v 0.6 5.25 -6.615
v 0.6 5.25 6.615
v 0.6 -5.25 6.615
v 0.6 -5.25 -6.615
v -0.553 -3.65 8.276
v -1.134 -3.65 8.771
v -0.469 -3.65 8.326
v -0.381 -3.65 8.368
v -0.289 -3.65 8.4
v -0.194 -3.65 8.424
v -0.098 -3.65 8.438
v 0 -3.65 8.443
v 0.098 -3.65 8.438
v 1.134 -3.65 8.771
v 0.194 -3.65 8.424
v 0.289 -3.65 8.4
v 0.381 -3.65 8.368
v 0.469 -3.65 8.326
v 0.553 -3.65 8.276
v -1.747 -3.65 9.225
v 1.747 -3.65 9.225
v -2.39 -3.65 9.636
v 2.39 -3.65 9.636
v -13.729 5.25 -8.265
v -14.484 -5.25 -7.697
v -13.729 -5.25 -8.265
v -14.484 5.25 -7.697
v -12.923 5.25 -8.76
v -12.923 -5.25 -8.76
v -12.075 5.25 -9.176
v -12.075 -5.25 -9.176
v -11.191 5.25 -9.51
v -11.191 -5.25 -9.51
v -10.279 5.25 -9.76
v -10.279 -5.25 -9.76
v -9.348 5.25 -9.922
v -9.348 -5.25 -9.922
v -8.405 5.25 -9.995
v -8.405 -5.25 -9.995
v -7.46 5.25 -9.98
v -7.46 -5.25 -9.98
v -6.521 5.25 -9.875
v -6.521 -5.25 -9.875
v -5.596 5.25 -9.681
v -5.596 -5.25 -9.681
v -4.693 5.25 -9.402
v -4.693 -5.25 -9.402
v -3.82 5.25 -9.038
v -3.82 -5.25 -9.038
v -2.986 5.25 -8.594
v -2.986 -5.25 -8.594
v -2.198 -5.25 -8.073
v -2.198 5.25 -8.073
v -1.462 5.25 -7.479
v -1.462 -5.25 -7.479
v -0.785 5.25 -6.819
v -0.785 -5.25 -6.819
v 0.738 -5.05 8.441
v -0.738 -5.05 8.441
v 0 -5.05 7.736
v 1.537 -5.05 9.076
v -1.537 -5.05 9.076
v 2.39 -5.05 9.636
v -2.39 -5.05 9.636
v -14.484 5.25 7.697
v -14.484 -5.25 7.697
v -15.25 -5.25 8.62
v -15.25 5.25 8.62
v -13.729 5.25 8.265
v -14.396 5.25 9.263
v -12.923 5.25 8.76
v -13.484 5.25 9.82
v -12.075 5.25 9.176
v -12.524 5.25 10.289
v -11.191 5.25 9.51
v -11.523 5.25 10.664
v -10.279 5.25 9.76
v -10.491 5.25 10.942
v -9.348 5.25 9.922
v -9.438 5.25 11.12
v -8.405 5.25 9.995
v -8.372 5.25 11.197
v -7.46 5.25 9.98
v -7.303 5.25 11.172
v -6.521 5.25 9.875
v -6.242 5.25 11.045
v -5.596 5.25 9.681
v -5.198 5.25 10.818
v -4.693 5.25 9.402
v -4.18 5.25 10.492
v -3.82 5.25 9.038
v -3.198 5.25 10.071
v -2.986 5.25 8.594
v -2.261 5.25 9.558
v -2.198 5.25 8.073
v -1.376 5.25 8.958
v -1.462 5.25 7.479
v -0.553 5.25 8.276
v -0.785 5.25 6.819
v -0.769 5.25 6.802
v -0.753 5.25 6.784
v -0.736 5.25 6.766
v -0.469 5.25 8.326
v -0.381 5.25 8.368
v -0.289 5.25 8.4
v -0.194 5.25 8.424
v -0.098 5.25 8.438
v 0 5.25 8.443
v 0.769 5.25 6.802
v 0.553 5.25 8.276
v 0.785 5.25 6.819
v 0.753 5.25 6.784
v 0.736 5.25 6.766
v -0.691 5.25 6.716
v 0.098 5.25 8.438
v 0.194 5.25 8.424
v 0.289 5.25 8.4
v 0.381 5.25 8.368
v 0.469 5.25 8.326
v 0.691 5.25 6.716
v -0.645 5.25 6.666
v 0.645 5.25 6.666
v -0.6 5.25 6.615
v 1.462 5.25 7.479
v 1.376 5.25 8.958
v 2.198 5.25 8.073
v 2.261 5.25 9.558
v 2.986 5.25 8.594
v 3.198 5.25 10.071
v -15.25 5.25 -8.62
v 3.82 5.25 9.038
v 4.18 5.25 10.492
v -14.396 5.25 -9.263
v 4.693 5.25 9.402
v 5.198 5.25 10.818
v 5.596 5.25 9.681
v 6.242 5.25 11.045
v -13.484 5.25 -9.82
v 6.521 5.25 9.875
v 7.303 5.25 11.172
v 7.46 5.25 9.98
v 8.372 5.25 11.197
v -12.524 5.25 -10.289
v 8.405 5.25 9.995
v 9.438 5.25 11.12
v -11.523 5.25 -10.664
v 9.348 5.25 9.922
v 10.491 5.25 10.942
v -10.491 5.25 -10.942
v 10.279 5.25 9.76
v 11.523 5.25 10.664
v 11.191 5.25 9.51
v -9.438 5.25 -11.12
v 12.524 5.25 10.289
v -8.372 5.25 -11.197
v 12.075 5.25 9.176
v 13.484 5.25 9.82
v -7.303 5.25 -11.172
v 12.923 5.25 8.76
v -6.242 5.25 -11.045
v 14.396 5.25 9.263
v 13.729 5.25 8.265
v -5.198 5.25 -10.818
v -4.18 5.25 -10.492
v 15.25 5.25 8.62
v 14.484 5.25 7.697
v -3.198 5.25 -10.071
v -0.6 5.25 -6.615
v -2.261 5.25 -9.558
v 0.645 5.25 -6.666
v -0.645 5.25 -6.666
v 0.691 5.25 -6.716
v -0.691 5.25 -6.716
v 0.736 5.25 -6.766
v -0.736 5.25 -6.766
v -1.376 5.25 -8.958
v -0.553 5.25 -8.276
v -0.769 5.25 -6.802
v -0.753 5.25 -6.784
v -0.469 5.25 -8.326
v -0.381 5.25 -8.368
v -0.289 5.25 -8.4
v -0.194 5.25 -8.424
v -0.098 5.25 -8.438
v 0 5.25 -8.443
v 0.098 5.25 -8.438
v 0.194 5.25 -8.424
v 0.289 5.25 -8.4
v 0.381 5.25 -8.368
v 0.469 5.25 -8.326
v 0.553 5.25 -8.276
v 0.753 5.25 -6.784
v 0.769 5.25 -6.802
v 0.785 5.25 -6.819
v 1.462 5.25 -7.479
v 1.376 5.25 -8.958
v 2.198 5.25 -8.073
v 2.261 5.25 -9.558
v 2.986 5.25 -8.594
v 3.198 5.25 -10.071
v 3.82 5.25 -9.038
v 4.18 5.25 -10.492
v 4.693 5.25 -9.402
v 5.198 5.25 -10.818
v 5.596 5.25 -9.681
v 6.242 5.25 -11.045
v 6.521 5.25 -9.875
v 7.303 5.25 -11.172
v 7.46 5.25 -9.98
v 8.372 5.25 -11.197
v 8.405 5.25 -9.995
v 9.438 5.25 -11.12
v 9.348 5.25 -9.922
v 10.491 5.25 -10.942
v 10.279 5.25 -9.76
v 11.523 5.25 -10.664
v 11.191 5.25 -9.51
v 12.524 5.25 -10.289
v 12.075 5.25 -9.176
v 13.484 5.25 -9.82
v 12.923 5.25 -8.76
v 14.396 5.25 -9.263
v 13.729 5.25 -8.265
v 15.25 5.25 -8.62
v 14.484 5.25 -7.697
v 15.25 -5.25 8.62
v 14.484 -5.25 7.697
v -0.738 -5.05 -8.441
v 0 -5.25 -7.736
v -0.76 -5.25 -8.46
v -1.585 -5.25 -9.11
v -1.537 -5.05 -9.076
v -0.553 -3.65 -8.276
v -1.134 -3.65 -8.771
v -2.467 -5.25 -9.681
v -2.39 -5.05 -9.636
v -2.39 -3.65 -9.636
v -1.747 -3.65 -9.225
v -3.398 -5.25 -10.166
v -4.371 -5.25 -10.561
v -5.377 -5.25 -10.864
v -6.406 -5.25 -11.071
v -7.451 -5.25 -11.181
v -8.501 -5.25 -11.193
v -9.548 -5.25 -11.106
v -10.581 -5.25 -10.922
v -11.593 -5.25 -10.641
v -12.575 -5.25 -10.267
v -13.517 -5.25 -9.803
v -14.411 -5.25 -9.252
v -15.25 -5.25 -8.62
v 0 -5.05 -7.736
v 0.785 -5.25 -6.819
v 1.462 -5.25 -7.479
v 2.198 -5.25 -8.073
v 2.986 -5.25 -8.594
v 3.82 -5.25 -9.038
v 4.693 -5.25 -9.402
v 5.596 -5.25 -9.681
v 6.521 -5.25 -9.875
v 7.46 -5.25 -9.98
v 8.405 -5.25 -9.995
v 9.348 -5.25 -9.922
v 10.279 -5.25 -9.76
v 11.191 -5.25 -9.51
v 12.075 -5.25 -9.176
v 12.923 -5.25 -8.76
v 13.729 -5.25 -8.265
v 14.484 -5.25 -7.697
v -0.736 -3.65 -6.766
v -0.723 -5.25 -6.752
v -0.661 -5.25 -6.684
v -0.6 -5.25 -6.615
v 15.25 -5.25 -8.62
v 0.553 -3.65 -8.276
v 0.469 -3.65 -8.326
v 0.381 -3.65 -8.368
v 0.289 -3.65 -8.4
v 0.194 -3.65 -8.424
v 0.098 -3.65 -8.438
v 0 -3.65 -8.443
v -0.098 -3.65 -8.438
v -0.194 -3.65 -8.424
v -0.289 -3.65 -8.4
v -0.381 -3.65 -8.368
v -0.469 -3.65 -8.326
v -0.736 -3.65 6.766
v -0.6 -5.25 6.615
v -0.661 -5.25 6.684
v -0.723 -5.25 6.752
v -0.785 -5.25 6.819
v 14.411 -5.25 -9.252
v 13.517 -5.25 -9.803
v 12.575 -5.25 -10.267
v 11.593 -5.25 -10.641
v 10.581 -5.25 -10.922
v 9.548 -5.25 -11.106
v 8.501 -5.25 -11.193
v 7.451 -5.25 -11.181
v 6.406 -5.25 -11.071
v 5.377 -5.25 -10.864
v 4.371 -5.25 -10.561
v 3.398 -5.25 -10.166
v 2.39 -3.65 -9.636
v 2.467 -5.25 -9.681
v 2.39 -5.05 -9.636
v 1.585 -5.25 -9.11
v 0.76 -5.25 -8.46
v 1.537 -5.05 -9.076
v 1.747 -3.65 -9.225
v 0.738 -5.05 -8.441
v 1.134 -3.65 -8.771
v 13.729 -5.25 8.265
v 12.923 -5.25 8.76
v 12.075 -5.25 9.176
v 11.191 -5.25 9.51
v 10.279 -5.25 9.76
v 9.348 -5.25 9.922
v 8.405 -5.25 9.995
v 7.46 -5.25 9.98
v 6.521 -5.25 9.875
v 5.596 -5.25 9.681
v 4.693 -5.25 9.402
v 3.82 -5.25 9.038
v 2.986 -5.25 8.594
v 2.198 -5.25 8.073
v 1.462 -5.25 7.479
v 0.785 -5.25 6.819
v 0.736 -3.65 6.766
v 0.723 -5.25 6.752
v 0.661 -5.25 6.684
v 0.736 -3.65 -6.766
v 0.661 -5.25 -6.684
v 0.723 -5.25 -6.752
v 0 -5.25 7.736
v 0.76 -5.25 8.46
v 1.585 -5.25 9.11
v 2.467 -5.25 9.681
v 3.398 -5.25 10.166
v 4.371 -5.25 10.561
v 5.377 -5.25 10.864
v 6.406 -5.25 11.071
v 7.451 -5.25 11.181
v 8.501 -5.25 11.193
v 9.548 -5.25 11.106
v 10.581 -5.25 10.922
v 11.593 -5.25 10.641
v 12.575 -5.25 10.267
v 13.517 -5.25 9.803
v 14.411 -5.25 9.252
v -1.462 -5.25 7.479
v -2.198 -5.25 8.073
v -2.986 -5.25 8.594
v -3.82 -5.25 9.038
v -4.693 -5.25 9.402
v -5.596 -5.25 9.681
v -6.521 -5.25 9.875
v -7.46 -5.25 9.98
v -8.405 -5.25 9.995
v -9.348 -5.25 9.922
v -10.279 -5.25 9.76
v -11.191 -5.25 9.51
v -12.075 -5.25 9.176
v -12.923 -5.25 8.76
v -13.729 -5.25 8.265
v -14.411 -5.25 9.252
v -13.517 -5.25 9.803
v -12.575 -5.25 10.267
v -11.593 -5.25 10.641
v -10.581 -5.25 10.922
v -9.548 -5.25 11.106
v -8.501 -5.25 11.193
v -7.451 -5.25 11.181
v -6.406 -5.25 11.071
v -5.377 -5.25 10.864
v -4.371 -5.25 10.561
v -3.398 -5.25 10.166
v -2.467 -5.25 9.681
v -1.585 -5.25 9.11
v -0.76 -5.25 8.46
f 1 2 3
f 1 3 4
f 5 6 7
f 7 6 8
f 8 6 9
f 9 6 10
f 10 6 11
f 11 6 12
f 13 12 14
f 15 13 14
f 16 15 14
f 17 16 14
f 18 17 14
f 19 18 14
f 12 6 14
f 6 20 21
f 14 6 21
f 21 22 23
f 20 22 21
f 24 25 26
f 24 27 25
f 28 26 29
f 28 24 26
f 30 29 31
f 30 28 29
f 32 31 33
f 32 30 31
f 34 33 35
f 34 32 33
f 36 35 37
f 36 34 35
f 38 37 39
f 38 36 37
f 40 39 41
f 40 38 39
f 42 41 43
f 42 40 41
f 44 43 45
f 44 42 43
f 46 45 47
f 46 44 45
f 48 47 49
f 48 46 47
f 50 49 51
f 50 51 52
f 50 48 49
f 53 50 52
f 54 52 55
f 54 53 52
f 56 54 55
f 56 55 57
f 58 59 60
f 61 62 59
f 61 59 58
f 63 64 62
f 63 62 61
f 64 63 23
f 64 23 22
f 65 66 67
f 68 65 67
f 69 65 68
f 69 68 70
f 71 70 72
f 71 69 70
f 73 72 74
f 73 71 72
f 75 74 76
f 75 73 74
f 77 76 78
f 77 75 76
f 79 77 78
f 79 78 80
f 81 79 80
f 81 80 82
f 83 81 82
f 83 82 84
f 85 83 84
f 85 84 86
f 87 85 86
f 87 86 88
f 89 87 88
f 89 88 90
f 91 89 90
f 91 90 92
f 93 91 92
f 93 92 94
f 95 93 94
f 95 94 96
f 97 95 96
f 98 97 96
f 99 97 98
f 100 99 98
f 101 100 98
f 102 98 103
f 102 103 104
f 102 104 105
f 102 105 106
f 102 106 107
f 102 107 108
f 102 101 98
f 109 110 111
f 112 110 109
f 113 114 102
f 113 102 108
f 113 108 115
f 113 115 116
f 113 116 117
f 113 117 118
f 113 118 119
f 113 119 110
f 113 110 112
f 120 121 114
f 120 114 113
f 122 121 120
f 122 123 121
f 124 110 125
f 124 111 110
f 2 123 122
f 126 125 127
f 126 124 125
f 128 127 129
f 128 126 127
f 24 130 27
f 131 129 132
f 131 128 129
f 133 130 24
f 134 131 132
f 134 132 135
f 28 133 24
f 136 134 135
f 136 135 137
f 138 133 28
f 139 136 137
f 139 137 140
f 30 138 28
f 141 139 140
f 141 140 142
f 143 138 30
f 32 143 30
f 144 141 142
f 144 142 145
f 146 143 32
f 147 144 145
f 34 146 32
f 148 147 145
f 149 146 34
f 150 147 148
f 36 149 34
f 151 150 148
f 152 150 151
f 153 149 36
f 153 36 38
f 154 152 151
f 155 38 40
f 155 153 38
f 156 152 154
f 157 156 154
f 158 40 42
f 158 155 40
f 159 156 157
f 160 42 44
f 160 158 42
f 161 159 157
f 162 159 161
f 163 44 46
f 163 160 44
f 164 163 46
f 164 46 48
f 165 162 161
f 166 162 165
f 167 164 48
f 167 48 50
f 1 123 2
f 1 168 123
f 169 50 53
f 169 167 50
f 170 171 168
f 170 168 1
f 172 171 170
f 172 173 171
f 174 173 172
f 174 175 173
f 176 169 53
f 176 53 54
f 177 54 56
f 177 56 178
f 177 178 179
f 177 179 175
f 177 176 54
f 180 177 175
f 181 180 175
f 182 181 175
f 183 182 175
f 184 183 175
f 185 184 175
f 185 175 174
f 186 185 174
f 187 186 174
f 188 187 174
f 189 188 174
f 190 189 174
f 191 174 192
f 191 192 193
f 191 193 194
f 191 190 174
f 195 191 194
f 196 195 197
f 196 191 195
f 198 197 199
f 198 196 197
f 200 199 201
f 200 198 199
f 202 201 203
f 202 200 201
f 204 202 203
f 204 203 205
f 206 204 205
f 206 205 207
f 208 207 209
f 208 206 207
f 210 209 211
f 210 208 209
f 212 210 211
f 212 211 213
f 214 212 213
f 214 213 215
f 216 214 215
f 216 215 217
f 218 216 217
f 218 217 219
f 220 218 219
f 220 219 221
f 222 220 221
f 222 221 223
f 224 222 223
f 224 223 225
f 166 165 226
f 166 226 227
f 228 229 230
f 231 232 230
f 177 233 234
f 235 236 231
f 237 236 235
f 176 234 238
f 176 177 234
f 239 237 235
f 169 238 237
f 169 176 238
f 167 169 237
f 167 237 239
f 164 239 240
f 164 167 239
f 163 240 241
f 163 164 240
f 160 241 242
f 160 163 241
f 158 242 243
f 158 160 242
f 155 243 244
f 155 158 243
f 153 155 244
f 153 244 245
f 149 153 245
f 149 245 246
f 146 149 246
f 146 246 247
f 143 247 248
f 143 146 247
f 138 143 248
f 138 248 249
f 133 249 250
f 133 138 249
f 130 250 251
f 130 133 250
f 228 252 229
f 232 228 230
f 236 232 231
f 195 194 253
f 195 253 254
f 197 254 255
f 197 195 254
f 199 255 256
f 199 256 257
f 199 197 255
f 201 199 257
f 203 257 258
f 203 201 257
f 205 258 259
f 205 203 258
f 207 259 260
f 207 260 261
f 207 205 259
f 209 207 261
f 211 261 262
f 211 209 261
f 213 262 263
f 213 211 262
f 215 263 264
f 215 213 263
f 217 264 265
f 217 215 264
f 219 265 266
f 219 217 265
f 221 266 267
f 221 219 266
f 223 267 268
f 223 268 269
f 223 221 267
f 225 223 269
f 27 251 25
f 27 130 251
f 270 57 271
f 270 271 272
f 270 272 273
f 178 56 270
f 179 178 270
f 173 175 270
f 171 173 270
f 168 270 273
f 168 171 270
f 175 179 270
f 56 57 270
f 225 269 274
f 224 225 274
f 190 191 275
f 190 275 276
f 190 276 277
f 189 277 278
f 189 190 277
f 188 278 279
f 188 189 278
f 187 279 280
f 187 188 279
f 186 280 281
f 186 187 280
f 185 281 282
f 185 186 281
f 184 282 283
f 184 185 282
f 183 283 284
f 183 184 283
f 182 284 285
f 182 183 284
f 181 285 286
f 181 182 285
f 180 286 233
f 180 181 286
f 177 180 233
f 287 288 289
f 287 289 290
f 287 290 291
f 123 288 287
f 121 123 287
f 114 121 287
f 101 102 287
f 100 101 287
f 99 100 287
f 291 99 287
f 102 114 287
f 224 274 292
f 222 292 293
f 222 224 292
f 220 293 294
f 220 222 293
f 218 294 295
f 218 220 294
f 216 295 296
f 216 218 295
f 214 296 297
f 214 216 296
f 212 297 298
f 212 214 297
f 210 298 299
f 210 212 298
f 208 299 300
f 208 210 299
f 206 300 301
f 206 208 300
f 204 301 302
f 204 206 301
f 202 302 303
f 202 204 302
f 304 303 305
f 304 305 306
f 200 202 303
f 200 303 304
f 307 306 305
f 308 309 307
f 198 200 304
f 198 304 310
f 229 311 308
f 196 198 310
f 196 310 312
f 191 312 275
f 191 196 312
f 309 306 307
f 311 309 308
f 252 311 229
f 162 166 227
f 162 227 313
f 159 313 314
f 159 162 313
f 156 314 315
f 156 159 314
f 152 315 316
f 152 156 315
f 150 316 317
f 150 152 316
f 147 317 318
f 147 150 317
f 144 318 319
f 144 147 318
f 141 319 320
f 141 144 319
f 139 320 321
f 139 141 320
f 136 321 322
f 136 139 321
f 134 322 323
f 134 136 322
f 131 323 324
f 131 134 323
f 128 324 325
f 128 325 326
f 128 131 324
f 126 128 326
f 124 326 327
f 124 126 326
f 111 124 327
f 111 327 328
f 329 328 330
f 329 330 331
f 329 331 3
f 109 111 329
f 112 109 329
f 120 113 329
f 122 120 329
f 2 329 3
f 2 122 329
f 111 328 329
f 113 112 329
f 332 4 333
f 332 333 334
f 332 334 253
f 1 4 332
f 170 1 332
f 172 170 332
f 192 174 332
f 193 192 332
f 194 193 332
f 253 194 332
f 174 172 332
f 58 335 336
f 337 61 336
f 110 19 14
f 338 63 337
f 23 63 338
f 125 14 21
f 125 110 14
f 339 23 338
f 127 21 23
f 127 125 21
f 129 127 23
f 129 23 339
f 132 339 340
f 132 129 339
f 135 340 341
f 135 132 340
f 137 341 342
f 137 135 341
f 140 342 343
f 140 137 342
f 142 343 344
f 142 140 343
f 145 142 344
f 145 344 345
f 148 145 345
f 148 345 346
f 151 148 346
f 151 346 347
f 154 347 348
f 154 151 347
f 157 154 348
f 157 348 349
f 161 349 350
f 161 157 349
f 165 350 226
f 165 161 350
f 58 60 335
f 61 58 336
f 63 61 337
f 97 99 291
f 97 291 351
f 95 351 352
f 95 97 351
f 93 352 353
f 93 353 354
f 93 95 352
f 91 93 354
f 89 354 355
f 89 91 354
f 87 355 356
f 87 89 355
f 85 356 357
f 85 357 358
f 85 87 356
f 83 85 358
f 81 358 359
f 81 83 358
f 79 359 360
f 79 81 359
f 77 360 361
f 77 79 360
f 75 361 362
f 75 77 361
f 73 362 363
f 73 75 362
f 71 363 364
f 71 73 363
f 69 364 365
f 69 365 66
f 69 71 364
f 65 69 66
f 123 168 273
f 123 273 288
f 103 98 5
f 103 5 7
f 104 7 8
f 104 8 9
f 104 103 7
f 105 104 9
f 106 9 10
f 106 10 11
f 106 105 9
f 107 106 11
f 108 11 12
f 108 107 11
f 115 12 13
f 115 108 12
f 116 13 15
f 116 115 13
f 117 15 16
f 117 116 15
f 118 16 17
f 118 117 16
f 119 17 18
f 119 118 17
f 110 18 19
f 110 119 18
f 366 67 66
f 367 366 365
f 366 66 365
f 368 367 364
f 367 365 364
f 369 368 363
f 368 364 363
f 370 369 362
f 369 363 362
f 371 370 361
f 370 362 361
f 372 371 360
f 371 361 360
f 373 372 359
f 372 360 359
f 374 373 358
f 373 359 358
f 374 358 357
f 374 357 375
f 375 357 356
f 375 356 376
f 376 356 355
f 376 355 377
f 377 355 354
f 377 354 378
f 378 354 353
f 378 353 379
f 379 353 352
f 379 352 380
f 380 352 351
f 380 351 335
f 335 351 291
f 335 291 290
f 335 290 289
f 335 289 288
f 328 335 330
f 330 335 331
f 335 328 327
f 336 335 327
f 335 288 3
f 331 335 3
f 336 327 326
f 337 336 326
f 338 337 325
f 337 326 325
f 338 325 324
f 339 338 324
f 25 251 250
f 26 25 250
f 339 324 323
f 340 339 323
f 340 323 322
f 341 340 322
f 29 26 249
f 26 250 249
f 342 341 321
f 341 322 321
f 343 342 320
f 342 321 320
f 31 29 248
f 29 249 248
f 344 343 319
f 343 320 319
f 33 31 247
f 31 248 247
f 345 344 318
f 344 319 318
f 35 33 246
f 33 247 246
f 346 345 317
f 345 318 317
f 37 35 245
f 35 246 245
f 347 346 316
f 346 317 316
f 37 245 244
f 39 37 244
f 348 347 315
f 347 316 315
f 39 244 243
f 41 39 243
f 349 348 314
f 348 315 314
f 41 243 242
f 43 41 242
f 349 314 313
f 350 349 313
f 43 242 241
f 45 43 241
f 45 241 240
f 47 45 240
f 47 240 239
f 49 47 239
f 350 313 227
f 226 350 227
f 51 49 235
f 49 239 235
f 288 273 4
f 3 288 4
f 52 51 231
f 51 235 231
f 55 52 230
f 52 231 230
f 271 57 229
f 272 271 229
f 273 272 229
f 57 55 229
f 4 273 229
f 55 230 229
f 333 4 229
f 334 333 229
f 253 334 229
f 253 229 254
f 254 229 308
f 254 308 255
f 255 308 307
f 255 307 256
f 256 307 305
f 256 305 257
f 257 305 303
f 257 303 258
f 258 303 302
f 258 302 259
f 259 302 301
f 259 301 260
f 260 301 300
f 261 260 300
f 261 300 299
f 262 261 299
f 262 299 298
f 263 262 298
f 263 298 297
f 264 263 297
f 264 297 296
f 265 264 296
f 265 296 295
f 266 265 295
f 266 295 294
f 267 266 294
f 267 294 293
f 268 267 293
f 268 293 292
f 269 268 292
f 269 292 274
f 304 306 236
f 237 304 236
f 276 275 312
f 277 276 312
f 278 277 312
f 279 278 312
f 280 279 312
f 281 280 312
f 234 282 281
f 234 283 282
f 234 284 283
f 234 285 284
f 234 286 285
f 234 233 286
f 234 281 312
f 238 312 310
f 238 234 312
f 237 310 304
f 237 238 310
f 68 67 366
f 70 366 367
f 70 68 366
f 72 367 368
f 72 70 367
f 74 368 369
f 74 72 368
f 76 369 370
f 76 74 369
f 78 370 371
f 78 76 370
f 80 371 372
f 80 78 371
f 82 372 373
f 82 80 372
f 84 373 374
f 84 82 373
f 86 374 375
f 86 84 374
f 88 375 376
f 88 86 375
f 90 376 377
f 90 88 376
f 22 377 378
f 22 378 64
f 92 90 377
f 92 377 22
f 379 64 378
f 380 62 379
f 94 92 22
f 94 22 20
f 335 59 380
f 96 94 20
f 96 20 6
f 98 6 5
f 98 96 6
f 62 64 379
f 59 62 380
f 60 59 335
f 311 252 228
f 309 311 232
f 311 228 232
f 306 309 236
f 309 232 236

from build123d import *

# Parameters (mm, degrees)
BOSS_EXTRUDE1_DEPTH = 5.25
BOSS_EXTRUDE2_START = -0.2
BOSS_EXTRUDE2_DEPTH = 1.4
SKETCH2_R           = 1
BOSS_EXTRUDE3_DEPTH = 8.9


with BuildPart() as part:
    # Sketch1 → Boss-Extrude1 (new, symmetric)
    with BuildSketch(Plane(origin=(0, 0, 0), x_dir=(1, 0, 0), z_dir=(0, 1, 0))):
        with BuildLine():
            ThreePointArc((0, -7.735559645), (-0.4049689, -7.287992259), (-0.785238344, -6.8192583))
            ThreePointArc((-0.785238344, -6.8192583), (-7.460228587, -9.979548781), (-14.483869819, -7.69670089))
            Line((-14.483869819, -7.69670089), (-15.25, -8.620304997))
            ThreePointArc((-15.25, -8.620304997), (-7.450762238, -11.181198596), (0, -7.735559645))
        make_face()
        with BuildLine():
            ThreePointArc((14.483869819, -7.69670089), (7.460228587, -9.979548781), (0.785238344, -6.8192583))
            ThreePointArc((0.785238344, -6.8192583), (0.4049689, -7.287992259), (0, -7.735559645))
            ThreePointArc((0, -7.735559645), (7.450762238, -11.181198596), (15.25, -8.620304997))
            Line((15.25, -8.620304997), (14.483869819, -7.69670089))
        make_face()
        with BuildLine():
            Line((0.6, -6.615), (-0.6, -6.615))
            ThreePointArc((-0.6, -6.615), (-0.691915101, -6.71776766), (-0.785238344, -6.8192583))
            ThreePointArc((-0.785238344, -6.8192583), (-0.4049689, -7.287992259), (0, -7.735559645))
            ThreePointArc((0, -7.735559645), (0.4049689, -7.287992259), (0.785238344, -6.8192583))
            ThreePointArc((0.785238344, -6.8192583), (0.691915101, -6.71776766), (0.6, -6.615))
        make_face()
        with BuildLine():
            Line((-0.6, 4.93148467), (-0.6, -4.93148467))
            ThreePointArc((-0.6, -4.93148467), (-0.312960425, -5.406599961), (0, -5.865056097))
            ThreePointArc((0, -5.865056097), (0.312960425, -5.406599961), (0.6, -4.93148467))
            Line((0.6, -4.93148467), (0.6, 4.93148467))
            ThreePointArc((0.6, 4.93148467), (0.312960425, 5.406599961), (0, 5.865056097))
            ThreePointArc((0, 5.865056097), (-0.312960425, 5.406599961), (-0.6, 4.93148467))
        make_face()
        with BuildLine():
            ThreePointArc((0, 7.735559645), (-0.4049689, 7.287992259), (-0.785238344, 6.8192583))
            ThreePointArc((-0.785238344, 6.8192583), (-0.691915101, 6.71776766), (-0.6, 6.615))
            Line((-0.6, 6.615), (0.6, 6.615))
            ThreePointArc((0.6, 6.615), (0.691915101, 6.71776766), (0.785238344, 6.8192583))
            ThreePointArc((0.785238344, 6.8192583), (0.4049689, 7.287992259), (0, 7.735559645))
        make_face()
        with BuildLine():
            ThreePointArc((-14.483869819, 7.69670089), (-7.460228587, 9.979548781), (-0.785238344, 6.8192583))
            ThreePointArc((-0.785238344, 6.8192583), (-0.4049689, 7.287992259), (0, 7.735559645))
            ThreePointArc((0, 7.735559645), (-7.450762238, 11.181198596), (-15.25, 8.620304997))
            Line((-15.25, 8.620304997), (-14.483869819, 7.69670089))
        make_face()
        with BuildLine():
            ThreePointArc((15.25, 8.620304997), (7.450762238, 11.181198596), (0, 7.735559645))
            ThreePointArc((0, 7.735559645), (0.4049689, 7.287992259), (0.785238344, 6.8192583))
            ThreePointArc((0.785238344, 6.8192583), (7.460228587, 9.979548781), (14.483869819, 7.69670089))
            Line((14.483869819, 7.69670089), (15.25, 8.620304997))
        make_face()
        with BuildLine():
            ThreePointArc((0, -5.865056097), (-0.290991494, -6.247235392), (-0.6, -6.615))
            Line((-0.6, -6.615), (0.6, -6.615))
            ThreePointArc((0.6, -6.615), (0.290991494, -6.247235392), (0, -5.865056097))
        make_face()
        with BuildLine():
            ThreePointArc((0, -5.865056097), (0.290991494, -6.247235392), (0.6, -6.615))
            Line((0.6, -6.615), (0.6, -4.93148467))
            ThreePointArc((0.6, -4.93148467), (0.312960425, -5.406599961), (0, -5.865056097))
        make_face()
        with BuildLine():
            ThreePointArc((0, 5.865056097), (0.312960425, 5.406599961), (0.6, 4.93148467))
            Line((0.6, 4.93148467), (0.6, 6.615))
            ThreePointArc((0.6, 6.615), (0.290991494, 6.247235392), (0, 5.865056097))
        make_face()
        with BuildLine():
            Line((-0.6, -4.93148467), (-0.6, -6.615))
            ThreePointArc((-0.6, -6.615), (-0.290991494, -6.247235392), (0, -5.865056097))
            ThreePointArc((0, -5.865056097), (-0.312960425, -5.406599961), (-0.6, -4.93148467))
        make_face()
        with BuildLine():
            Line((-0.6, 6.615), (-0.6, 4.93148467))
            ThreePointArc((-0.6, 4.93148467), (-0.312960425, 5.406599961), (0, 5.865056097))
            ThreePointArc((0, 5.865056097), (-0.290991494, 6.247235392), (-0.6, 6.615))
        make_face()
        with BuildLine():
            Line((0.6, 6.615), (-0.6, 6.615))
            ThreePointArc((-0.6, 6.615), (-0.290991494, 6.247235392), (0, 5.865056097))
            ThreePointArc((0, 5.865056097), (0.290991494, 6.247235392), (0.6, 6.615))
        make_face()
    extrude(amount=BOSS_EXTRUDE1_DEPTH, both=True)

    # Sketch3 → Boss-Extrude2 (add)
    with BuildSketch(Plane.XZ.offset(5.25).offset(BOSS_EXTRUDE2_START)):
        Polygon((0, -7.735559645), (2.39016182, -9.635559645), (-2.39016182, -9.635559645), align=None)
        Polygon((0, 7.735559645), (2.39016182, 9.635559645), (-2.39016182, 9.635559645), align=None)
    extrude(amount=-BOSS_EXTRUDE2_DEPTH)

    # Sketch2 → Boss-Extrude3 (add)
    with BuildSketch(Plane(origin=(0, 5.25, 0), x_dir=(1, 0, 0), z_dir=(0, 1, 0))):
        with Locations((0, 7.443042592)):
            Circle(SKETCH2_R)
        with Locations((0, -7.443042592)):
            Circle(SKETCH2_R)
    extrude(amount=-BOSS_EXTRUDE3_DEPTH)


solid = part.part
